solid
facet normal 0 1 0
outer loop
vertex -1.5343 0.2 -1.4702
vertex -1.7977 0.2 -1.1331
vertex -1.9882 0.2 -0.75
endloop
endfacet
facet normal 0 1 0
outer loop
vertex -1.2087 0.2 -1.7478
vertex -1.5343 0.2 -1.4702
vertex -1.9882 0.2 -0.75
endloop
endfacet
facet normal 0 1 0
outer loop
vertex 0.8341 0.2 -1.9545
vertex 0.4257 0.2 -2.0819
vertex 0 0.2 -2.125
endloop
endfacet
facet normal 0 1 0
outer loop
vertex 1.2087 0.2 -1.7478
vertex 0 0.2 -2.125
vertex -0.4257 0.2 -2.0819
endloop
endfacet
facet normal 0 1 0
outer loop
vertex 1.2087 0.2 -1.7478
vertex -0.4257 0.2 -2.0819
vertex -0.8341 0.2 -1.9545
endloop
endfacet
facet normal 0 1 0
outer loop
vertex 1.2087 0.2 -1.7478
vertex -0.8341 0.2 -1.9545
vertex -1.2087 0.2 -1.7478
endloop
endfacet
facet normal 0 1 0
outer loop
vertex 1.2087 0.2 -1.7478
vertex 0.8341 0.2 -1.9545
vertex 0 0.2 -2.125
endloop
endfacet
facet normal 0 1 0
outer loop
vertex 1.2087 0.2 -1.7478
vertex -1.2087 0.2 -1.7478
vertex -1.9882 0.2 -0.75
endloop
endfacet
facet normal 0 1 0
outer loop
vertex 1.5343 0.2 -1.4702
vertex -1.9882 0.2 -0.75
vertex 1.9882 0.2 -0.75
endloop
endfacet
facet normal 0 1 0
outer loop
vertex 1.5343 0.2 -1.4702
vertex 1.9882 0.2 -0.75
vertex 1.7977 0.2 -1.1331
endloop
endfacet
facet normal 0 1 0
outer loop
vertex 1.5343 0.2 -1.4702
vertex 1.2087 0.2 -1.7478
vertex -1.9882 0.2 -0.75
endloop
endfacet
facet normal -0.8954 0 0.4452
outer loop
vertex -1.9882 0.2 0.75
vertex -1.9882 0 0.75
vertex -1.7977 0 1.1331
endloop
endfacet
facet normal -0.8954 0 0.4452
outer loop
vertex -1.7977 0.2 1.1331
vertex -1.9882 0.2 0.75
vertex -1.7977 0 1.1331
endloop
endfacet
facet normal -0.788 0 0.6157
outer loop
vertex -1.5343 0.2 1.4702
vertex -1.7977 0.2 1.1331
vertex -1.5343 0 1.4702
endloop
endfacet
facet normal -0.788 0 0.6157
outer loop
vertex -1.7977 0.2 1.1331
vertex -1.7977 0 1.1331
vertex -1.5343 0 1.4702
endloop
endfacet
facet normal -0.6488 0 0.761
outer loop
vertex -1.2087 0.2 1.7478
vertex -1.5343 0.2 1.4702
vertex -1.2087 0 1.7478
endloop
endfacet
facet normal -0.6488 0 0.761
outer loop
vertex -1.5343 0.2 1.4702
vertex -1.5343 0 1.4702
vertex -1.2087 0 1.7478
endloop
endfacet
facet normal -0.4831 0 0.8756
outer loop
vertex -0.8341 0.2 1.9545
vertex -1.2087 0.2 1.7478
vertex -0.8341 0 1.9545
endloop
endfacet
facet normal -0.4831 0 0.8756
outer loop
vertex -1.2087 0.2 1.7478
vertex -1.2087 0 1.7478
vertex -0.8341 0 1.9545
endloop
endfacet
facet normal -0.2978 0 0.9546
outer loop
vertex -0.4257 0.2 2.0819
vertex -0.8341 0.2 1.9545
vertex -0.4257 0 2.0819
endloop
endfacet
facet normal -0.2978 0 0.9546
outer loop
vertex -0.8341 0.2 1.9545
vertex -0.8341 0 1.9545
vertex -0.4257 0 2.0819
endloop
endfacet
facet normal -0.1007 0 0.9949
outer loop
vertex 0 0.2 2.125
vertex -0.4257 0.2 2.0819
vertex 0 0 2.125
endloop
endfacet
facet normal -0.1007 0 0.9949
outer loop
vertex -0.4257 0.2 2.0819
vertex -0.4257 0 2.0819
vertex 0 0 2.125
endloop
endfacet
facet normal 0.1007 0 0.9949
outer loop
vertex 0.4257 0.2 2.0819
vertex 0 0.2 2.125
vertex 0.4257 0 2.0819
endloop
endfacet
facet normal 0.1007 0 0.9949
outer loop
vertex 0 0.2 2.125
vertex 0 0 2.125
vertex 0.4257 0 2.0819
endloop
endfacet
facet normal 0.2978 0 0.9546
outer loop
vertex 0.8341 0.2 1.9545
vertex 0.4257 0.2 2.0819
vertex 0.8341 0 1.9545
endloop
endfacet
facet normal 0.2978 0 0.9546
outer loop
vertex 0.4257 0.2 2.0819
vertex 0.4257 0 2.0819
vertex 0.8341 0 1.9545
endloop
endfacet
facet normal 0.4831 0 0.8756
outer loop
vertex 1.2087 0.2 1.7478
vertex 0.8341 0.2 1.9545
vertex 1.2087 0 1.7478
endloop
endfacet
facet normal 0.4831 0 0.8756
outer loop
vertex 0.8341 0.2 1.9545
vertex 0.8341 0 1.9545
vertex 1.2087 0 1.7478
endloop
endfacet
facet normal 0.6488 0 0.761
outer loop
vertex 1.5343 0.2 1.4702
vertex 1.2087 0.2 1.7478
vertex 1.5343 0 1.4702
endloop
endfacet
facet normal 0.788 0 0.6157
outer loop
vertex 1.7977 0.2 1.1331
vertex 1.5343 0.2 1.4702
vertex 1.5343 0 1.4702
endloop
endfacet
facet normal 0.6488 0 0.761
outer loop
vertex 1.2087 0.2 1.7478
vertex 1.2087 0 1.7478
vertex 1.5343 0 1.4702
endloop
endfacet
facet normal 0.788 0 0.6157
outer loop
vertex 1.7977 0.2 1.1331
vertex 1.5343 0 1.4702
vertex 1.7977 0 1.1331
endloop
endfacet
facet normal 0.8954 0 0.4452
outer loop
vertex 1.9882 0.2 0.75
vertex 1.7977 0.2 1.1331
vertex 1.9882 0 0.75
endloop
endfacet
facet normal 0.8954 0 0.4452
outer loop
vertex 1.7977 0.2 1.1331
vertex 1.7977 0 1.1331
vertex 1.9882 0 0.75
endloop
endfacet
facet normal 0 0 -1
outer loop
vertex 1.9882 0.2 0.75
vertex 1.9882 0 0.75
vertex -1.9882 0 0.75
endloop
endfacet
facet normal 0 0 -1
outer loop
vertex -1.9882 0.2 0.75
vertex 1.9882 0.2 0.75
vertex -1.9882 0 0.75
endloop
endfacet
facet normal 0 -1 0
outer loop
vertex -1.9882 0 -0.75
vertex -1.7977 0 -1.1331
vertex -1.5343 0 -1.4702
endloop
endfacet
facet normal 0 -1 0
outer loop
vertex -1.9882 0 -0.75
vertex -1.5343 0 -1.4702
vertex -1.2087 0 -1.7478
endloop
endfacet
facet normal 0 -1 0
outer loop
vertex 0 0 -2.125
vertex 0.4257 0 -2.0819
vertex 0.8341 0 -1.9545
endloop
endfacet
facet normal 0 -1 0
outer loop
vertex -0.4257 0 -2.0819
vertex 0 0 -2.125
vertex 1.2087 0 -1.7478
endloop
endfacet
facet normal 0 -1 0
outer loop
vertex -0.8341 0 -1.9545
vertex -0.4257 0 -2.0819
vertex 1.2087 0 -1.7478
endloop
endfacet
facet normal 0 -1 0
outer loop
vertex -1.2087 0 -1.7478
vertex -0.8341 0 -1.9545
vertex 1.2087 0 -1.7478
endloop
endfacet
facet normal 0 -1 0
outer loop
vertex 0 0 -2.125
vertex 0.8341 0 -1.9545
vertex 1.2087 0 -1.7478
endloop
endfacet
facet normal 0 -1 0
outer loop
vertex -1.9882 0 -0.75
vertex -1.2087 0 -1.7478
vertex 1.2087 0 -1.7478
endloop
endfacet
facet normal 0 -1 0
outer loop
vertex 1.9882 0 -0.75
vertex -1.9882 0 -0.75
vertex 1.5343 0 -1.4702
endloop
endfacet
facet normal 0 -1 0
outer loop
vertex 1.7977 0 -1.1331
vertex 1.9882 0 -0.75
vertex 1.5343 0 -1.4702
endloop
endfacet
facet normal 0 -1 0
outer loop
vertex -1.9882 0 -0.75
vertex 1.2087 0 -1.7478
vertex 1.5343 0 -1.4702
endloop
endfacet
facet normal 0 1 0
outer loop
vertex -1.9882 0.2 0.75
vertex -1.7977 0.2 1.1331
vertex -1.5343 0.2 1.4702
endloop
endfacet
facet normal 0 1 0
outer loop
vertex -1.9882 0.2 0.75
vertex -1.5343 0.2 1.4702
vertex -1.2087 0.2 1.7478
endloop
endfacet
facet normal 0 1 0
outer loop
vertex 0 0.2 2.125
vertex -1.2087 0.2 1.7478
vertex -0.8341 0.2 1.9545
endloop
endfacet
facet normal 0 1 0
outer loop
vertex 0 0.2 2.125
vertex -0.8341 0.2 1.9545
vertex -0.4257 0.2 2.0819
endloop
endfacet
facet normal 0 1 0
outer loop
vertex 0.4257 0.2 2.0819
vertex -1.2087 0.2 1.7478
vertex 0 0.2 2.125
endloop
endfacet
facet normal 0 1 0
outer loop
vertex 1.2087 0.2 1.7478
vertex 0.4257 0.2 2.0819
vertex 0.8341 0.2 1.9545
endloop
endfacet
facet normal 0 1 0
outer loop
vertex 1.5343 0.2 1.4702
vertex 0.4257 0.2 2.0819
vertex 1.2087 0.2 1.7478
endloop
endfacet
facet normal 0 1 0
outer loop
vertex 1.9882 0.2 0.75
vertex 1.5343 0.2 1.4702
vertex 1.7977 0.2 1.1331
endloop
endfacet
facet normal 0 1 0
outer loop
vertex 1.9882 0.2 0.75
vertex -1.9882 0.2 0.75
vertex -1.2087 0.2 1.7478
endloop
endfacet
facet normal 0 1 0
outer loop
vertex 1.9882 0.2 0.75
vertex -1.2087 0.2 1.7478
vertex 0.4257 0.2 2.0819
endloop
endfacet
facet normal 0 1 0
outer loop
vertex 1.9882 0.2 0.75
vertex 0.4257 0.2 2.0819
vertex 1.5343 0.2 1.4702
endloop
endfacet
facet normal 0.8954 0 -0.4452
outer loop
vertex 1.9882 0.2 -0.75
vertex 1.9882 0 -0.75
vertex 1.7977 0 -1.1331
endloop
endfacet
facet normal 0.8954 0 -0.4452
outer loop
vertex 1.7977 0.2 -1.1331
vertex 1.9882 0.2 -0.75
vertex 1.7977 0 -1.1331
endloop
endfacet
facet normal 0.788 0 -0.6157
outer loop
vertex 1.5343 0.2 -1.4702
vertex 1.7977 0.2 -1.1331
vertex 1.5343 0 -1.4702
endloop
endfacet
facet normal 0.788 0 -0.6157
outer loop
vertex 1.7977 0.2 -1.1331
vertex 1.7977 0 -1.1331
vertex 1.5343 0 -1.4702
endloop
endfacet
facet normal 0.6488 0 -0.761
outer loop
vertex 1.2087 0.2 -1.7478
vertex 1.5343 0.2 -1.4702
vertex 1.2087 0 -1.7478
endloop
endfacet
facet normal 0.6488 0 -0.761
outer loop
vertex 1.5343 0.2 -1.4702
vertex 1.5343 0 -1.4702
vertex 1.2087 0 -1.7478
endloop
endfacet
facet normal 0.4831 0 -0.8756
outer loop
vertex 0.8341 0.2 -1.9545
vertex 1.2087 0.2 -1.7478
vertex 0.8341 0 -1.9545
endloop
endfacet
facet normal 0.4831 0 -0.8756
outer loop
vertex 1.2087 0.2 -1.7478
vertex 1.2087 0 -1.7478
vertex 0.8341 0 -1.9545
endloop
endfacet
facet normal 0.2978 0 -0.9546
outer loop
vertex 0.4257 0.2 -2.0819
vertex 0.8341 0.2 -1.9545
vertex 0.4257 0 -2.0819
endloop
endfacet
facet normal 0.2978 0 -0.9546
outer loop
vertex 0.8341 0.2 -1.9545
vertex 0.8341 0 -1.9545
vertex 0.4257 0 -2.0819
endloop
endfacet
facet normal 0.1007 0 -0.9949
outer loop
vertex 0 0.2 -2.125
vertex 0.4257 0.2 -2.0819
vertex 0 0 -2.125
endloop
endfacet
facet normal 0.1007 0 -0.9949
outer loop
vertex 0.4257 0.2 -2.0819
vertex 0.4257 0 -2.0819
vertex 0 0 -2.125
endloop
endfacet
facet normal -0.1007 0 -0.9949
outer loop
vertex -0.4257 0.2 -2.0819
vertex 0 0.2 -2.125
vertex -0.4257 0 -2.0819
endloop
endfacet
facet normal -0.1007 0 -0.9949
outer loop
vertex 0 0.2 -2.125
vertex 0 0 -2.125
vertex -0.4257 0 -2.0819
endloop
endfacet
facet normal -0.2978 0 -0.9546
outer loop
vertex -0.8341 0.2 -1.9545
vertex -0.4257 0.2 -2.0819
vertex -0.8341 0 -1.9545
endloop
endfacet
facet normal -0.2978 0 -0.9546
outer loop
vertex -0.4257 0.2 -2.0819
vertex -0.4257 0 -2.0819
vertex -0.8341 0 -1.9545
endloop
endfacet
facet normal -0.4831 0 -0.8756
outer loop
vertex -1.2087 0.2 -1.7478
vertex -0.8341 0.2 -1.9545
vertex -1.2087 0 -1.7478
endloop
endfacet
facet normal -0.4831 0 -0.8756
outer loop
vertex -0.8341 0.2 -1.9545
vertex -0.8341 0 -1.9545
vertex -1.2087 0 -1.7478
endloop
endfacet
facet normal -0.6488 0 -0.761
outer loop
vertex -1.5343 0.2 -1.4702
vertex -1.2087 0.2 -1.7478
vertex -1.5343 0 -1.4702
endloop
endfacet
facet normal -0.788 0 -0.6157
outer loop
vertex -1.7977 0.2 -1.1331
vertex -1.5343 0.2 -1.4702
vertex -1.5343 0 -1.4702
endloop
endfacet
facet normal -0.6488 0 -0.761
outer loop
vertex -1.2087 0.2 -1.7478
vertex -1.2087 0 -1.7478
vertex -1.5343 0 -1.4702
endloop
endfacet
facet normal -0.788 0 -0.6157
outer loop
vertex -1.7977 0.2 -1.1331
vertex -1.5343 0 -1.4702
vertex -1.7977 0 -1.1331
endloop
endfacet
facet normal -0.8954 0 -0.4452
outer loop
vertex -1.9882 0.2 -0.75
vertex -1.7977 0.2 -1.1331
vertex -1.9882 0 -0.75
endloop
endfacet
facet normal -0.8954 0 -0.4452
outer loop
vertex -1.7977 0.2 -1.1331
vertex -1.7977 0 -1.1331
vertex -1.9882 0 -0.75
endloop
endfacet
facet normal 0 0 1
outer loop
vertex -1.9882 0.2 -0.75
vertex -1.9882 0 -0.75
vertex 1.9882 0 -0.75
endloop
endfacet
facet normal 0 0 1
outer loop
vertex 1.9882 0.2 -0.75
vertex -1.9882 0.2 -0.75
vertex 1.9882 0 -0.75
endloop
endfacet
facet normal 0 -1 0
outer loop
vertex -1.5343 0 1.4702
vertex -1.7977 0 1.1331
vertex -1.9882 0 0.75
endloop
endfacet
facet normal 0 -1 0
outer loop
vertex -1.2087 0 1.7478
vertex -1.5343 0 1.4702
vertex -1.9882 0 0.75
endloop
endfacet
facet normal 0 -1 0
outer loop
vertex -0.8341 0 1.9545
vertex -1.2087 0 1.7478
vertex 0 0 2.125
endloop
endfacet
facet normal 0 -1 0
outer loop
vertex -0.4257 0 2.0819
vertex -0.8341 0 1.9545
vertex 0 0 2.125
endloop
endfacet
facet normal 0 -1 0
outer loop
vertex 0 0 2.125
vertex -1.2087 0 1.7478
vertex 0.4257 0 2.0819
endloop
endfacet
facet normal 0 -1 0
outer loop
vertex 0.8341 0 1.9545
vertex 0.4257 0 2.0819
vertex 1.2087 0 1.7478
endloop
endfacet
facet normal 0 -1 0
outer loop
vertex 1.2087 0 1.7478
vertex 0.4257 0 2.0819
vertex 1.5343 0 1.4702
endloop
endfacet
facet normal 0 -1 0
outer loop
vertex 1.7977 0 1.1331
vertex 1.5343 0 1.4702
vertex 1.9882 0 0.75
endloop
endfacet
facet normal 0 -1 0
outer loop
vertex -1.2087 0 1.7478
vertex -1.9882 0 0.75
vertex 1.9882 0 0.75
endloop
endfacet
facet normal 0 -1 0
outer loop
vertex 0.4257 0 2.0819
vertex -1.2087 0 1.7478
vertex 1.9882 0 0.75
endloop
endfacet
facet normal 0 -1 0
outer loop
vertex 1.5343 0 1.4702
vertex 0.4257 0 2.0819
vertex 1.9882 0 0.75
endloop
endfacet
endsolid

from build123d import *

# Parameters (mm, degrees)
BOSS_EXTRUDE1_DEPTH   = 0.2
BOSS_EXTRUDE1_2_DEPTH = 0.2


with BuildPart() as part:
    # Sketch1 → Boss-Extrude1 (new body)
    with BuildSketch(Plane(origin=(0, 0, 0), x_dir=(1, 0, 0), z_dir=(0, 1, 0))):
        with BuildLine():
            ThreePointArc((-1.988246715, -0.75), (0, -2.125), (1.988246715, -0.75))
            Line((1.988246715, -0.75), (-1.988246715, -0.75))
        make_face()
    extrude(amount=BOSS_EXTRUDE1_DEPTH)


with BuildPart() as body_2:
    # Sketch1 → Boss-Extrude1 2 (new body)
    with BuildSketch(Plane(origin=(0, 0, 0), x_dir=(1, 0, 0), z_dir=(0, 1, 0))):
        with BuildLine():
            Line((-1.988246715, 0.75), (1.988246715, 0.75))
            ThreePointArc((1.988246715, 0.75), (0, 2.125), (-1.988246715, 0.75))
        make_face()
    extrude(amount=BOSS_EXTRUDE1_2_DEPTH)


solid = Compound([part.part, body_2.part])
